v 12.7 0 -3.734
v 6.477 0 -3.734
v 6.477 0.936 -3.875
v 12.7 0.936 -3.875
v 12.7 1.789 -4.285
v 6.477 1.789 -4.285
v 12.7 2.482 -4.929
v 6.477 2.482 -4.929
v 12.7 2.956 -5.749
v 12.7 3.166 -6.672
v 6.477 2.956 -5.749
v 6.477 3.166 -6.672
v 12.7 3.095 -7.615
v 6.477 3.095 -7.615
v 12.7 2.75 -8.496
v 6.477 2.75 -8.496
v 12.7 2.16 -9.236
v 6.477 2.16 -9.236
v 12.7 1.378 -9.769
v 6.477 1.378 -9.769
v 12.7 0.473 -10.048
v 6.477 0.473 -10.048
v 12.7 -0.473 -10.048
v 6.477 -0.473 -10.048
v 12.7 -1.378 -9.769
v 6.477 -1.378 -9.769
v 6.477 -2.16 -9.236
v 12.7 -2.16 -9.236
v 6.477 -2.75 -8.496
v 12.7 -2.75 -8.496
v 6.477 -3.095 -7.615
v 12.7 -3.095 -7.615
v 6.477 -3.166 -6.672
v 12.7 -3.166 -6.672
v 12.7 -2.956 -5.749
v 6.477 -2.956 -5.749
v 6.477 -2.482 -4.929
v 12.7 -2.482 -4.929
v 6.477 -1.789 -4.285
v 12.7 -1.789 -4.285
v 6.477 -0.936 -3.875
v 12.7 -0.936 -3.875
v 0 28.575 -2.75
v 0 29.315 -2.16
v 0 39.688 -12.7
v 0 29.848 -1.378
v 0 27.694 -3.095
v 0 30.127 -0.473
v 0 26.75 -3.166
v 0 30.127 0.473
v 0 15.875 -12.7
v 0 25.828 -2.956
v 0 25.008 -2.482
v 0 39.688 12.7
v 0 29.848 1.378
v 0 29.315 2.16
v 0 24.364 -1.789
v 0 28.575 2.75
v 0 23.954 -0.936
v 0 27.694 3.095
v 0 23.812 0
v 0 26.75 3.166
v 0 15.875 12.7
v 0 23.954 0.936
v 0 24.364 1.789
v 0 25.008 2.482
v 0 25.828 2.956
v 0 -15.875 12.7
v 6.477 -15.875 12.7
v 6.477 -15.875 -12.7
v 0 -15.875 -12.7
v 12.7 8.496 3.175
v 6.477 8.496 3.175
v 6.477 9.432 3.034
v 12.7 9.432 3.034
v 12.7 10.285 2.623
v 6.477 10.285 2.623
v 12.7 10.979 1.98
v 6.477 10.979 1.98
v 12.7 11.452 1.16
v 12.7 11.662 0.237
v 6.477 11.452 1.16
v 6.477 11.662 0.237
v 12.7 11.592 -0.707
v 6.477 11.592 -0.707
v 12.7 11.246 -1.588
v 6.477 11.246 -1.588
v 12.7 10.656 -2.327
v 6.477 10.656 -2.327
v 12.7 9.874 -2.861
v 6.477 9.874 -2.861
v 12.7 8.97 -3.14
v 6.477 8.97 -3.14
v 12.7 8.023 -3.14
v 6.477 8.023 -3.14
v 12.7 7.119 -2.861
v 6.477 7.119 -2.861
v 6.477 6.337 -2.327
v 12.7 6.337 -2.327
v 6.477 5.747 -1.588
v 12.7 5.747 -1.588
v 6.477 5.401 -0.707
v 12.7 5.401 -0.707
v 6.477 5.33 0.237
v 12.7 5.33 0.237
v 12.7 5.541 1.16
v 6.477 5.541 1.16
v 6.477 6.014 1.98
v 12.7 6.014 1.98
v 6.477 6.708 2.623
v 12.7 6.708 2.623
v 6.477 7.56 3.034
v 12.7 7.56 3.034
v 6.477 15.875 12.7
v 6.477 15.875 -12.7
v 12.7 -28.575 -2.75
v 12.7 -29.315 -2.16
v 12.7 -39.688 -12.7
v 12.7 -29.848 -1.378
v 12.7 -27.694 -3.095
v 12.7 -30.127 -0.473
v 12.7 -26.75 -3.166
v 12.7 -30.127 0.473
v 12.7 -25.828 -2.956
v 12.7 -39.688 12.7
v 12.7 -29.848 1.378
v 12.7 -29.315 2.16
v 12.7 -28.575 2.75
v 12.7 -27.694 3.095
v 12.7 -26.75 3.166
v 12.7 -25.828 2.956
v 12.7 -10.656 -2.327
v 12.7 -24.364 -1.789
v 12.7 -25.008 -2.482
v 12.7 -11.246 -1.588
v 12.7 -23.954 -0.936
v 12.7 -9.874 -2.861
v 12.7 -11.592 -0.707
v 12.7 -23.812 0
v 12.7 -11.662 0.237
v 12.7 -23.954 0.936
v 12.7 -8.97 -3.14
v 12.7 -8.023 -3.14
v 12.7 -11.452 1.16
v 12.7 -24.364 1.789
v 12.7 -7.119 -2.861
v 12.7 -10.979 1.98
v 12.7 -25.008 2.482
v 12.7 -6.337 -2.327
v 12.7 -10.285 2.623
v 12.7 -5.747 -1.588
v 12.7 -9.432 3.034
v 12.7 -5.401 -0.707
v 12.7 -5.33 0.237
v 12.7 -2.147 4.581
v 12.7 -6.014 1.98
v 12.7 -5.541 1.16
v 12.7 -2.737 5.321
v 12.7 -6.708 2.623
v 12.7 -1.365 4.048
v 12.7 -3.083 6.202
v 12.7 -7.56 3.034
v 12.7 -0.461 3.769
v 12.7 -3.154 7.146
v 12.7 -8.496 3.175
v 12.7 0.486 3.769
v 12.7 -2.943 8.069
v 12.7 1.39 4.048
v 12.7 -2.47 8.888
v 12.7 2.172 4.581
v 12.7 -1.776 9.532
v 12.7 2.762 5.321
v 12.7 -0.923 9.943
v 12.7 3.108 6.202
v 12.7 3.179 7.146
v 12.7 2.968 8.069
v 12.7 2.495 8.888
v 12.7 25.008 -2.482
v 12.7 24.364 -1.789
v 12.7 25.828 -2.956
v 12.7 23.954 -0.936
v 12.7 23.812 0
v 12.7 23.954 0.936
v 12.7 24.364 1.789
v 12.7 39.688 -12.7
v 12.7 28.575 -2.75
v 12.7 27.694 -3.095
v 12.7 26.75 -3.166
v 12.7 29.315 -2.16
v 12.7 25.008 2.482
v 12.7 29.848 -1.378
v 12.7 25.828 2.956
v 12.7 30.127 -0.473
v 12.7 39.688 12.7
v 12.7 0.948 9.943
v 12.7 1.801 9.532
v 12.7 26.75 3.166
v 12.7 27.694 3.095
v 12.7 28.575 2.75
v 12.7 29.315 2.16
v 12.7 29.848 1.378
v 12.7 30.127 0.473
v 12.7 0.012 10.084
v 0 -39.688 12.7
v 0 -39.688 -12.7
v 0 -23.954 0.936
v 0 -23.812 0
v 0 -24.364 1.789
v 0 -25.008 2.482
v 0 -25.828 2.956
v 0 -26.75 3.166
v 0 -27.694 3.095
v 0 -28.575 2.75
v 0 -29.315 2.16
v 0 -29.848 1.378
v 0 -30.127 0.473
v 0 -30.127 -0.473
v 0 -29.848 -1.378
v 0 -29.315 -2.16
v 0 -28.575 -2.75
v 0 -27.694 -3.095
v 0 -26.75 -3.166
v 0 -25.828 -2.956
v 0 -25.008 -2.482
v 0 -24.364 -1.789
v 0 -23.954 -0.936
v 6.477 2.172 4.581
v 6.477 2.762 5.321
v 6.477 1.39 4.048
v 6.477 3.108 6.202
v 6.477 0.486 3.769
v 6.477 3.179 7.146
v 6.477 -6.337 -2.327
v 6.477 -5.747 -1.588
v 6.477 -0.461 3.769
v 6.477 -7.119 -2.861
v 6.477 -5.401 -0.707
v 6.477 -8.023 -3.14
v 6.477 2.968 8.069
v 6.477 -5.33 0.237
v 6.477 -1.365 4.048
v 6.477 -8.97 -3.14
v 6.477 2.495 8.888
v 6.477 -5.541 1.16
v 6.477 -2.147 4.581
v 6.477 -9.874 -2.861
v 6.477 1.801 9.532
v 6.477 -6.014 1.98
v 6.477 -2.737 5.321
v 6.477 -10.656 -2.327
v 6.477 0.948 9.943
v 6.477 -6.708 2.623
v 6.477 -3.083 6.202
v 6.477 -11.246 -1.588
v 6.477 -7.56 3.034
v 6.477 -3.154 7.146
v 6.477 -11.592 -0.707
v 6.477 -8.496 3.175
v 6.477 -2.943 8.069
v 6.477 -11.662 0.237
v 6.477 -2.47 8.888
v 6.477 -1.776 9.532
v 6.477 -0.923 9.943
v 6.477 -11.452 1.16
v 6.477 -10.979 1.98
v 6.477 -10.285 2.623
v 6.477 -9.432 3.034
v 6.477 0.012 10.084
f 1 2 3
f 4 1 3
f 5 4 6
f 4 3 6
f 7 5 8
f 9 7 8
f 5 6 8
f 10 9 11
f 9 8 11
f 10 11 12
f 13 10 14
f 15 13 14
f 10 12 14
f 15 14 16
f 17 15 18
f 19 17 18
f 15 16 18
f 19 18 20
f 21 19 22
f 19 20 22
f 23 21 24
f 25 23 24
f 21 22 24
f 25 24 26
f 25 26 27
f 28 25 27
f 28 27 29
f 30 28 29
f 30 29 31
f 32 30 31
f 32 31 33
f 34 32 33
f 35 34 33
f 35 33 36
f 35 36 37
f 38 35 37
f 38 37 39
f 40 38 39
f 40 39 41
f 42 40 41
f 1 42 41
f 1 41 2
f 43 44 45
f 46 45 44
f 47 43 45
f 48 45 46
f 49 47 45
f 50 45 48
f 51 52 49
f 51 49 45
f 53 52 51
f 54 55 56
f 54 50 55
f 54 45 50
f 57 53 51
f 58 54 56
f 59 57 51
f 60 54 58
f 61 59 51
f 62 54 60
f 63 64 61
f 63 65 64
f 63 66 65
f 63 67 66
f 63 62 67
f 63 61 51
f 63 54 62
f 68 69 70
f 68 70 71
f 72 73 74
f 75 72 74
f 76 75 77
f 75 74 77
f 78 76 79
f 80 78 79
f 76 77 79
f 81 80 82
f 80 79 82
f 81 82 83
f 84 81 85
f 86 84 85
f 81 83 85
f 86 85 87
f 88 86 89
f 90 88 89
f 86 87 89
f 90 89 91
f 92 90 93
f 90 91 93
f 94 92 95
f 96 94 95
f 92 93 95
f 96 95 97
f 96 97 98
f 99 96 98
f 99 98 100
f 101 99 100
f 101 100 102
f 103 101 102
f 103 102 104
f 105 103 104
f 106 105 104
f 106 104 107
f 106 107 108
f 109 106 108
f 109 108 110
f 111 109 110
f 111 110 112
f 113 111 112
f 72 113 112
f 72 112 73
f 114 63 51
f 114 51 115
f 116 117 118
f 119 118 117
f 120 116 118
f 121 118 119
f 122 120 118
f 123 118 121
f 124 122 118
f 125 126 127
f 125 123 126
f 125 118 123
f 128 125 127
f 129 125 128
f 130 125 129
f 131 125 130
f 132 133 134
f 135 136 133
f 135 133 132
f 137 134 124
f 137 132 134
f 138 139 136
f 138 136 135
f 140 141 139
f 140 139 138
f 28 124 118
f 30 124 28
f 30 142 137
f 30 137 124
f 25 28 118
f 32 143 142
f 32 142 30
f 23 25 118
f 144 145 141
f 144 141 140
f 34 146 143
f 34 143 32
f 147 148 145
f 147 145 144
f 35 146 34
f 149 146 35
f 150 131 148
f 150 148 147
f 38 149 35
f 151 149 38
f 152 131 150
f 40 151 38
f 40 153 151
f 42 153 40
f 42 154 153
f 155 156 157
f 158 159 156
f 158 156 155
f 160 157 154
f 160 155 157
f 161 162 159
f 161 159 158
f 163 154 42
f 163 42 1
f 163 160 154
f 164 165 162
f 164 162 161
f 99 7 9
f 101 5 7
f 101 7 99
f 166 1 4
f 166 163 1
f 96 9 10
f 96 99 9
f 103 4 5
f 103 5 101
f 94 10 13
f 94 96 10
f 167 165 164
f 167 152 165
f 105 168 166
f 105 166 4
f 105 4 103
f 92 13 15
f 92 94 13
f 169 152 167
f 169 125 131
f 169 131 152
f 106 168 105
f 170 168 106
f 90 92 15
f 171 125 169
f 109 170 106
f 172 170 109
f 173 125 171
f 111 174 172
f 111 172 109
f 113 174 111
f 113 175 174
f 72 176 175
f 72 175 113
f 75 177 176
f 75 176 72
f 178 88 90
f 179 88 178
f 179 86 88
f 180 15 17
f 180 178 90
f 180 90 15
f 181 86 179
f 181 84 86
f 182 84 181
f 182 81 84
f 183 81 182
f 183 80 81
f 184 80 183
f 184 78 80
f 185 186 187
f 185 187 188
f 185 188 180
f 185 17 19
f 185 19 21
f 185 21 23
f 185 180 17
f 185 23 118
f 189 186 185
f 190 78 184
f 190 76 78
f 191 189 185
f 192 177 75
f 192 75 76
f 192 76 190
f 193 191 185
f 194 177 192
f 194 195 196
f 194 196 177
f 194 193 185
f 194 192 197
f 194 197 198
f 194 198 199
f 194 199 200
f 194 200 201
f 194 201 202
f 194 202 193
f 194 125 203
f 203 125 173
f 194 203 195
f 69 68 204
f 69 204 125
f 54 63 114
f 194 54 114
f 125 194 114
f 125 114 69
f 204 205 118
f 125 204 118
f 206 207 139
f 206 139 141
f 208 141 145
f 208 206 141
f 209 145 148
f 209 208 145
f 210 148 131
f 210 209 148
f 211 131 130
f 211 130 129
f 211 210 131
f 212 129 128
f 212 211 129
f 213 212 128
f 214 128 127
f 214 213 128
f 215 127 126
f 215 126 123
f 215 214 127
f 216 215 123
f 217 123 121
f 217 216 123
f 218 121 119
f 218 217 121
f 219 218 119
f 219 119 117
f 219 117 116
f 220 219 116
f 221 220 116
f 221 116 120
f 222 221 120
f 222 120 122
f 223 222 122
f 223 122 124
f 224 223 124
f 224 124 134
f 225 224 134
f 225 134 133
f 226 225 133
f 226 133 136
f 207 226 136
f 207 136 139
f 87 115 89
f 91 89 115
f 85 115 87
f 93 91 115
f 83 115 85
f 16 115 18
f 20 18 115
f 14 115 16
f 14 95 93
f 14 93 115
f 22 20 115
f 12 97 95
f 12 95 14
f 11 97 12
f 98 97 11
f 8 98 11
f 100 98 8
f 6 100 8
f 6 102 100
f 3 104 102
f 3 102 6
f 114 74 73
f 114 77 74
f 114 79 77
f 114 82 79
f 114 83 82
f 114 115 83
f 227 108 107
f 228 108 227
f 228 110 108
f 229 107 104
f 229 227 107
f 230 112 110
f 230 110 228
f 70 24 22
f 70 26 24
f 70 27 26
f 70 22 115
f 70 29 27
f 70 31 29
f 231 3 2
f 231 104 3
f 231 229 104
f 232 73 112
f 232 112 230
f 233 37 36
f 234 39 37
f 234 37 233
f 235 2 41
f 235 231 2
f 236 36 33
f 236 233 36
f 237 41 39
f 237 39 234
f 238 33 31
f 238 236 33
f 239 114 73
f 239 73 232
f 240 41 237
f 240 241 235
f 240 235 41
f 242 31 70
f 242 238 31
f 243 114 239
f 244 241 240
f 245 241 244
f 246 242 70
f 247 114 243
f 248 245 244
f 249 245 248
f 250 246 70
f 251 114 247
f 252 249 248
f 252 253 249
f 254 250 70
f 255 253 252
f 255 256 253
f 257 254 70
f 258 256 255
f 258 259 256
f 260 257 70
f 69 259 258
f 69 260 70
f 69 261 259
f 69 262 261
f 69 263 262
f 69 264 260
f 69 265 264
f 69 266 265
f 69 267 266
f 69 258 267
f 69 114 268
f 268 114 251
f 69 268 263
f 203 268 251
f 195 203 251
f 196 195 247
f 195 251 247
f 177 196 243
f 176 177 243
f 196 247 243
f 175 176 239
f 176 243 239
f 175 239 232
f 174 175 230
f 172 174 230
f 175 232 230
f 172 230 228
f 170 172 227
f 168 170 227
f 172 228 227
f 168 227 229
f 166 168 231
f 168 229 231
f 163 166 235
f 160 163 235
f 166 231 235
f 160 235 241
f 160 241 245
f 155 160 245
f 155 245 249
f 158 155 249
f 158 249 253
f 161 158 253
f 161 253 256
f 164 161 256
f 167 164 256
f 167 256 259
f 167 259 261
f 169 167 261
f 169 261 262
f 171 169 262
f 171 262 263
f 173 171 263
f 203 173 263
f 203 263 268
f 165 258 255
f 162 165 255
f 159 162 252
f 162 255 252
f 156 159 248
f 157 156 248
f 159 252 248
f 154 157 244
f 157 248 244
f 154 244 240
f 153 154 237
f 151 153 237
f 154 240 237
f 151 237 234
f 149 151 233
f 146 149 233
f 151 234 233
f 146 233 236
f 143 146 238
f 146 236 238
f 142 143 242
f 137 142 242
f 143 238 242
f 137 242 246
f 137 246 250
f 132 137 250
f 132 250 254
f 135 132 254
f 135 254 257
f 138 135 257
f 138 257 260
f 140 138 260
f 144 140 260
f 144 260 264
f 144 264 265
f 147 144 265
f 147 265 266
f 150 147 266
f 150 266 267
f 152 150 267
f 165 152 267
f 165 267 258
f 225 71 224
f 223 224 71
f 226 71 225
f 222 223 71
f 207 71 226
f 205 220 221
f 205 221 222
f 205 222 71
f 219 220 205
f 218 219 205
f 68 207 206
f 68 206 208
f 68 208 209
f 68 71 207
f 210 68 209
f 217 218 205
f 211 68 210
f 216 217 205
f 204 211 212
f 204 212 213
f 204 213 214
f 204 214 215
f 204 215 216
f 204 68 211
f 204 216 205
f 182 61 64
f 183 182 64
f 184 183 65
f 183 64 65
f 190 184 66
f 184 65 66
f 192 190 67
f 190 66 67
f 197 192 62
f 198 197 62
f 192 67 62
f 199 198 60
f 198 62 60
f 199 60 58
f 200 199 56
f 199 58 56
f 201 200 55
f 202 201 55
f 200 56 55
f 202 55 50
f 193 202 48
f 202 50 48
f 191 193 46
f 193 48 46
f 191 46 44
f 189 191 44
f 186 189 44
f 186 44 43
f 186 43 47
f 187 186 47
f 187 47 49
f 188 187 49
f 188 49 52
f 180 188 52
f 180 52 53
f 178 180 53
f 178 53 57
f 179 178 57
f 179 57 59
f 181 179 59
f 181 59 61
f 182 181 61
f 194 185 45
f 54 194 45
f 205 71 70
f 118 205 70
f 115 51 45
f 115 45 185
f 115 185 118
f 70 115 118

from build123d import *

# Parameters (mm, degrees)
BOSS_EXTRUDE1_DEPTH = 12.7
CUT_EXTRUDE1_REACH  = 45.562
SKETCH2_R           = 3.175
CUT_EXTRUDE2_REACH  = 44.17
SKETCH3_R           = 3.175


with BuildPart() as part:
    # Sketch1 → Boss-Extrude1 (new, symmetric)
    with BuildSketch(Plane.XY):
        Polygon((0, 39.6875), (0, 15.875), (6.477, 15.875), (6.477, -15.875), (0, -15.875), (0, -39.6875), (12.7, -39.6875), (12.7, 39.6875), align=None)
    extrude(amount=BOSS_EXTRUDE1_DEPTH, both=True)

    # Sketch2 → Cut-Extrude1 (cut, up to next)
    with BuildSketch(Plane.ZY, mode=Mode.PRIVATE) as cut_extrude1_sk1:
        with Locations(Location((0, 26.9875, 0), (0, 0, 270))):
            Circle(SKETCH2_R)
    cut_extrude1_tool1 = extrude(cut_extrude1_sk1.sketch, amount=-CUT_EXTRUDE1_REACH, mode=Mode.PRIVATE) & part.part
    cut_extrude1 = cut_extrude1_tool1.solids().sort_by_distance((0, 26.9875, 0))[0]
    add(cut_extrude1, mode=Mode.SUBTRACT)

    # Mirror1: Cut-Extrude1 across plane
    add(cut_extrude1.mirror(Plane.ZX), mode=Mode.SUBTRACT)

    # Sketch3 → Cut-Extrude2 (cut, up to next)
    with BuildSketch(Plane.ZY.offset(-6.477), mode=Mode.PRIVATE) as cut_extrude2_sk1:
        with Locations((0, 8.4963)):
            Circle(SKETCH3_R)
    cut_extrude2_tool1 = extrude(cut_extrude2_sk1.sketch, amount=-CUT_EXTRUDE2_REACH, mode=Mode.PRIVATE) & part.part
    # Sketch3 → Cut-Extrude2 (cut, up to next)
    with BuildSketch(Plane.ZY.offset(-6.477), mode=Mode.PRIVATE) as cut_extrude2_sk2:
        with Locations((0, -8.4963)):
            Circle(SKETCH3_R)
    cut_extrude2_tool2 = extrude(cut_extrude2_sk2.sketch, amount=-CUT_EXTRUDE2_REACH, mode=Mode.PRIVATE) & part.part
    # Sketch3 → Cut-Extrude2 (cut, up to next)
    with BuildSketch(Plane.ZY.offset(-6.477), mode=Mode.PRIVATE) as cut_extrude2_sk3:
        with Locations((6.908794346, 0.0125)):
            Circle(SKETCH3_R)
    cut_extrude2_tool3 = extrude(cut_extrude2_sk3.sketch, amount=-CUT_EXTRUDE2_REACH, mode=Mode.PRIVATE) & part.part
    # Sketch3 → Cut-Extrude2 (cut, up to next)
    with BuildSketch(Plane.ZY.offset(-6.477), mode=Mode.PRIVATE) as cut_extrude2_sk4:
        with Locations((-6.908805654, 0)):
            Circle(SKETCH3_R)
    cut_extrude2_tool4 = extrude(cut_extrude2_sk4.sketch, amount=-CUT_EXTRUDE2_REACH, mode=Mode.PRIVATE) & part.part
    add(cut_extrude2_tool1.solids().sort_by_distance((6.477, 8.4963, 0))[0], mode=Mode.SUBTRACT)
    add(cut_extrude2_tool2.solids().sort_by_distance((6.477, -8.4963, 0))[0], mode=Mode.SUBTRACT)
    add(cut_extrude2_tool3.solids().sort_by_distance((6.477, 0.0125, 6.908794))[0], mode=Mode.SUBTRACT)
    add(cut_extrude2_tool4.solids().sort_by_distance((6.477, 0, -6.908806))[0], mode=Mode.SUBTRACT)


solid = part.part
